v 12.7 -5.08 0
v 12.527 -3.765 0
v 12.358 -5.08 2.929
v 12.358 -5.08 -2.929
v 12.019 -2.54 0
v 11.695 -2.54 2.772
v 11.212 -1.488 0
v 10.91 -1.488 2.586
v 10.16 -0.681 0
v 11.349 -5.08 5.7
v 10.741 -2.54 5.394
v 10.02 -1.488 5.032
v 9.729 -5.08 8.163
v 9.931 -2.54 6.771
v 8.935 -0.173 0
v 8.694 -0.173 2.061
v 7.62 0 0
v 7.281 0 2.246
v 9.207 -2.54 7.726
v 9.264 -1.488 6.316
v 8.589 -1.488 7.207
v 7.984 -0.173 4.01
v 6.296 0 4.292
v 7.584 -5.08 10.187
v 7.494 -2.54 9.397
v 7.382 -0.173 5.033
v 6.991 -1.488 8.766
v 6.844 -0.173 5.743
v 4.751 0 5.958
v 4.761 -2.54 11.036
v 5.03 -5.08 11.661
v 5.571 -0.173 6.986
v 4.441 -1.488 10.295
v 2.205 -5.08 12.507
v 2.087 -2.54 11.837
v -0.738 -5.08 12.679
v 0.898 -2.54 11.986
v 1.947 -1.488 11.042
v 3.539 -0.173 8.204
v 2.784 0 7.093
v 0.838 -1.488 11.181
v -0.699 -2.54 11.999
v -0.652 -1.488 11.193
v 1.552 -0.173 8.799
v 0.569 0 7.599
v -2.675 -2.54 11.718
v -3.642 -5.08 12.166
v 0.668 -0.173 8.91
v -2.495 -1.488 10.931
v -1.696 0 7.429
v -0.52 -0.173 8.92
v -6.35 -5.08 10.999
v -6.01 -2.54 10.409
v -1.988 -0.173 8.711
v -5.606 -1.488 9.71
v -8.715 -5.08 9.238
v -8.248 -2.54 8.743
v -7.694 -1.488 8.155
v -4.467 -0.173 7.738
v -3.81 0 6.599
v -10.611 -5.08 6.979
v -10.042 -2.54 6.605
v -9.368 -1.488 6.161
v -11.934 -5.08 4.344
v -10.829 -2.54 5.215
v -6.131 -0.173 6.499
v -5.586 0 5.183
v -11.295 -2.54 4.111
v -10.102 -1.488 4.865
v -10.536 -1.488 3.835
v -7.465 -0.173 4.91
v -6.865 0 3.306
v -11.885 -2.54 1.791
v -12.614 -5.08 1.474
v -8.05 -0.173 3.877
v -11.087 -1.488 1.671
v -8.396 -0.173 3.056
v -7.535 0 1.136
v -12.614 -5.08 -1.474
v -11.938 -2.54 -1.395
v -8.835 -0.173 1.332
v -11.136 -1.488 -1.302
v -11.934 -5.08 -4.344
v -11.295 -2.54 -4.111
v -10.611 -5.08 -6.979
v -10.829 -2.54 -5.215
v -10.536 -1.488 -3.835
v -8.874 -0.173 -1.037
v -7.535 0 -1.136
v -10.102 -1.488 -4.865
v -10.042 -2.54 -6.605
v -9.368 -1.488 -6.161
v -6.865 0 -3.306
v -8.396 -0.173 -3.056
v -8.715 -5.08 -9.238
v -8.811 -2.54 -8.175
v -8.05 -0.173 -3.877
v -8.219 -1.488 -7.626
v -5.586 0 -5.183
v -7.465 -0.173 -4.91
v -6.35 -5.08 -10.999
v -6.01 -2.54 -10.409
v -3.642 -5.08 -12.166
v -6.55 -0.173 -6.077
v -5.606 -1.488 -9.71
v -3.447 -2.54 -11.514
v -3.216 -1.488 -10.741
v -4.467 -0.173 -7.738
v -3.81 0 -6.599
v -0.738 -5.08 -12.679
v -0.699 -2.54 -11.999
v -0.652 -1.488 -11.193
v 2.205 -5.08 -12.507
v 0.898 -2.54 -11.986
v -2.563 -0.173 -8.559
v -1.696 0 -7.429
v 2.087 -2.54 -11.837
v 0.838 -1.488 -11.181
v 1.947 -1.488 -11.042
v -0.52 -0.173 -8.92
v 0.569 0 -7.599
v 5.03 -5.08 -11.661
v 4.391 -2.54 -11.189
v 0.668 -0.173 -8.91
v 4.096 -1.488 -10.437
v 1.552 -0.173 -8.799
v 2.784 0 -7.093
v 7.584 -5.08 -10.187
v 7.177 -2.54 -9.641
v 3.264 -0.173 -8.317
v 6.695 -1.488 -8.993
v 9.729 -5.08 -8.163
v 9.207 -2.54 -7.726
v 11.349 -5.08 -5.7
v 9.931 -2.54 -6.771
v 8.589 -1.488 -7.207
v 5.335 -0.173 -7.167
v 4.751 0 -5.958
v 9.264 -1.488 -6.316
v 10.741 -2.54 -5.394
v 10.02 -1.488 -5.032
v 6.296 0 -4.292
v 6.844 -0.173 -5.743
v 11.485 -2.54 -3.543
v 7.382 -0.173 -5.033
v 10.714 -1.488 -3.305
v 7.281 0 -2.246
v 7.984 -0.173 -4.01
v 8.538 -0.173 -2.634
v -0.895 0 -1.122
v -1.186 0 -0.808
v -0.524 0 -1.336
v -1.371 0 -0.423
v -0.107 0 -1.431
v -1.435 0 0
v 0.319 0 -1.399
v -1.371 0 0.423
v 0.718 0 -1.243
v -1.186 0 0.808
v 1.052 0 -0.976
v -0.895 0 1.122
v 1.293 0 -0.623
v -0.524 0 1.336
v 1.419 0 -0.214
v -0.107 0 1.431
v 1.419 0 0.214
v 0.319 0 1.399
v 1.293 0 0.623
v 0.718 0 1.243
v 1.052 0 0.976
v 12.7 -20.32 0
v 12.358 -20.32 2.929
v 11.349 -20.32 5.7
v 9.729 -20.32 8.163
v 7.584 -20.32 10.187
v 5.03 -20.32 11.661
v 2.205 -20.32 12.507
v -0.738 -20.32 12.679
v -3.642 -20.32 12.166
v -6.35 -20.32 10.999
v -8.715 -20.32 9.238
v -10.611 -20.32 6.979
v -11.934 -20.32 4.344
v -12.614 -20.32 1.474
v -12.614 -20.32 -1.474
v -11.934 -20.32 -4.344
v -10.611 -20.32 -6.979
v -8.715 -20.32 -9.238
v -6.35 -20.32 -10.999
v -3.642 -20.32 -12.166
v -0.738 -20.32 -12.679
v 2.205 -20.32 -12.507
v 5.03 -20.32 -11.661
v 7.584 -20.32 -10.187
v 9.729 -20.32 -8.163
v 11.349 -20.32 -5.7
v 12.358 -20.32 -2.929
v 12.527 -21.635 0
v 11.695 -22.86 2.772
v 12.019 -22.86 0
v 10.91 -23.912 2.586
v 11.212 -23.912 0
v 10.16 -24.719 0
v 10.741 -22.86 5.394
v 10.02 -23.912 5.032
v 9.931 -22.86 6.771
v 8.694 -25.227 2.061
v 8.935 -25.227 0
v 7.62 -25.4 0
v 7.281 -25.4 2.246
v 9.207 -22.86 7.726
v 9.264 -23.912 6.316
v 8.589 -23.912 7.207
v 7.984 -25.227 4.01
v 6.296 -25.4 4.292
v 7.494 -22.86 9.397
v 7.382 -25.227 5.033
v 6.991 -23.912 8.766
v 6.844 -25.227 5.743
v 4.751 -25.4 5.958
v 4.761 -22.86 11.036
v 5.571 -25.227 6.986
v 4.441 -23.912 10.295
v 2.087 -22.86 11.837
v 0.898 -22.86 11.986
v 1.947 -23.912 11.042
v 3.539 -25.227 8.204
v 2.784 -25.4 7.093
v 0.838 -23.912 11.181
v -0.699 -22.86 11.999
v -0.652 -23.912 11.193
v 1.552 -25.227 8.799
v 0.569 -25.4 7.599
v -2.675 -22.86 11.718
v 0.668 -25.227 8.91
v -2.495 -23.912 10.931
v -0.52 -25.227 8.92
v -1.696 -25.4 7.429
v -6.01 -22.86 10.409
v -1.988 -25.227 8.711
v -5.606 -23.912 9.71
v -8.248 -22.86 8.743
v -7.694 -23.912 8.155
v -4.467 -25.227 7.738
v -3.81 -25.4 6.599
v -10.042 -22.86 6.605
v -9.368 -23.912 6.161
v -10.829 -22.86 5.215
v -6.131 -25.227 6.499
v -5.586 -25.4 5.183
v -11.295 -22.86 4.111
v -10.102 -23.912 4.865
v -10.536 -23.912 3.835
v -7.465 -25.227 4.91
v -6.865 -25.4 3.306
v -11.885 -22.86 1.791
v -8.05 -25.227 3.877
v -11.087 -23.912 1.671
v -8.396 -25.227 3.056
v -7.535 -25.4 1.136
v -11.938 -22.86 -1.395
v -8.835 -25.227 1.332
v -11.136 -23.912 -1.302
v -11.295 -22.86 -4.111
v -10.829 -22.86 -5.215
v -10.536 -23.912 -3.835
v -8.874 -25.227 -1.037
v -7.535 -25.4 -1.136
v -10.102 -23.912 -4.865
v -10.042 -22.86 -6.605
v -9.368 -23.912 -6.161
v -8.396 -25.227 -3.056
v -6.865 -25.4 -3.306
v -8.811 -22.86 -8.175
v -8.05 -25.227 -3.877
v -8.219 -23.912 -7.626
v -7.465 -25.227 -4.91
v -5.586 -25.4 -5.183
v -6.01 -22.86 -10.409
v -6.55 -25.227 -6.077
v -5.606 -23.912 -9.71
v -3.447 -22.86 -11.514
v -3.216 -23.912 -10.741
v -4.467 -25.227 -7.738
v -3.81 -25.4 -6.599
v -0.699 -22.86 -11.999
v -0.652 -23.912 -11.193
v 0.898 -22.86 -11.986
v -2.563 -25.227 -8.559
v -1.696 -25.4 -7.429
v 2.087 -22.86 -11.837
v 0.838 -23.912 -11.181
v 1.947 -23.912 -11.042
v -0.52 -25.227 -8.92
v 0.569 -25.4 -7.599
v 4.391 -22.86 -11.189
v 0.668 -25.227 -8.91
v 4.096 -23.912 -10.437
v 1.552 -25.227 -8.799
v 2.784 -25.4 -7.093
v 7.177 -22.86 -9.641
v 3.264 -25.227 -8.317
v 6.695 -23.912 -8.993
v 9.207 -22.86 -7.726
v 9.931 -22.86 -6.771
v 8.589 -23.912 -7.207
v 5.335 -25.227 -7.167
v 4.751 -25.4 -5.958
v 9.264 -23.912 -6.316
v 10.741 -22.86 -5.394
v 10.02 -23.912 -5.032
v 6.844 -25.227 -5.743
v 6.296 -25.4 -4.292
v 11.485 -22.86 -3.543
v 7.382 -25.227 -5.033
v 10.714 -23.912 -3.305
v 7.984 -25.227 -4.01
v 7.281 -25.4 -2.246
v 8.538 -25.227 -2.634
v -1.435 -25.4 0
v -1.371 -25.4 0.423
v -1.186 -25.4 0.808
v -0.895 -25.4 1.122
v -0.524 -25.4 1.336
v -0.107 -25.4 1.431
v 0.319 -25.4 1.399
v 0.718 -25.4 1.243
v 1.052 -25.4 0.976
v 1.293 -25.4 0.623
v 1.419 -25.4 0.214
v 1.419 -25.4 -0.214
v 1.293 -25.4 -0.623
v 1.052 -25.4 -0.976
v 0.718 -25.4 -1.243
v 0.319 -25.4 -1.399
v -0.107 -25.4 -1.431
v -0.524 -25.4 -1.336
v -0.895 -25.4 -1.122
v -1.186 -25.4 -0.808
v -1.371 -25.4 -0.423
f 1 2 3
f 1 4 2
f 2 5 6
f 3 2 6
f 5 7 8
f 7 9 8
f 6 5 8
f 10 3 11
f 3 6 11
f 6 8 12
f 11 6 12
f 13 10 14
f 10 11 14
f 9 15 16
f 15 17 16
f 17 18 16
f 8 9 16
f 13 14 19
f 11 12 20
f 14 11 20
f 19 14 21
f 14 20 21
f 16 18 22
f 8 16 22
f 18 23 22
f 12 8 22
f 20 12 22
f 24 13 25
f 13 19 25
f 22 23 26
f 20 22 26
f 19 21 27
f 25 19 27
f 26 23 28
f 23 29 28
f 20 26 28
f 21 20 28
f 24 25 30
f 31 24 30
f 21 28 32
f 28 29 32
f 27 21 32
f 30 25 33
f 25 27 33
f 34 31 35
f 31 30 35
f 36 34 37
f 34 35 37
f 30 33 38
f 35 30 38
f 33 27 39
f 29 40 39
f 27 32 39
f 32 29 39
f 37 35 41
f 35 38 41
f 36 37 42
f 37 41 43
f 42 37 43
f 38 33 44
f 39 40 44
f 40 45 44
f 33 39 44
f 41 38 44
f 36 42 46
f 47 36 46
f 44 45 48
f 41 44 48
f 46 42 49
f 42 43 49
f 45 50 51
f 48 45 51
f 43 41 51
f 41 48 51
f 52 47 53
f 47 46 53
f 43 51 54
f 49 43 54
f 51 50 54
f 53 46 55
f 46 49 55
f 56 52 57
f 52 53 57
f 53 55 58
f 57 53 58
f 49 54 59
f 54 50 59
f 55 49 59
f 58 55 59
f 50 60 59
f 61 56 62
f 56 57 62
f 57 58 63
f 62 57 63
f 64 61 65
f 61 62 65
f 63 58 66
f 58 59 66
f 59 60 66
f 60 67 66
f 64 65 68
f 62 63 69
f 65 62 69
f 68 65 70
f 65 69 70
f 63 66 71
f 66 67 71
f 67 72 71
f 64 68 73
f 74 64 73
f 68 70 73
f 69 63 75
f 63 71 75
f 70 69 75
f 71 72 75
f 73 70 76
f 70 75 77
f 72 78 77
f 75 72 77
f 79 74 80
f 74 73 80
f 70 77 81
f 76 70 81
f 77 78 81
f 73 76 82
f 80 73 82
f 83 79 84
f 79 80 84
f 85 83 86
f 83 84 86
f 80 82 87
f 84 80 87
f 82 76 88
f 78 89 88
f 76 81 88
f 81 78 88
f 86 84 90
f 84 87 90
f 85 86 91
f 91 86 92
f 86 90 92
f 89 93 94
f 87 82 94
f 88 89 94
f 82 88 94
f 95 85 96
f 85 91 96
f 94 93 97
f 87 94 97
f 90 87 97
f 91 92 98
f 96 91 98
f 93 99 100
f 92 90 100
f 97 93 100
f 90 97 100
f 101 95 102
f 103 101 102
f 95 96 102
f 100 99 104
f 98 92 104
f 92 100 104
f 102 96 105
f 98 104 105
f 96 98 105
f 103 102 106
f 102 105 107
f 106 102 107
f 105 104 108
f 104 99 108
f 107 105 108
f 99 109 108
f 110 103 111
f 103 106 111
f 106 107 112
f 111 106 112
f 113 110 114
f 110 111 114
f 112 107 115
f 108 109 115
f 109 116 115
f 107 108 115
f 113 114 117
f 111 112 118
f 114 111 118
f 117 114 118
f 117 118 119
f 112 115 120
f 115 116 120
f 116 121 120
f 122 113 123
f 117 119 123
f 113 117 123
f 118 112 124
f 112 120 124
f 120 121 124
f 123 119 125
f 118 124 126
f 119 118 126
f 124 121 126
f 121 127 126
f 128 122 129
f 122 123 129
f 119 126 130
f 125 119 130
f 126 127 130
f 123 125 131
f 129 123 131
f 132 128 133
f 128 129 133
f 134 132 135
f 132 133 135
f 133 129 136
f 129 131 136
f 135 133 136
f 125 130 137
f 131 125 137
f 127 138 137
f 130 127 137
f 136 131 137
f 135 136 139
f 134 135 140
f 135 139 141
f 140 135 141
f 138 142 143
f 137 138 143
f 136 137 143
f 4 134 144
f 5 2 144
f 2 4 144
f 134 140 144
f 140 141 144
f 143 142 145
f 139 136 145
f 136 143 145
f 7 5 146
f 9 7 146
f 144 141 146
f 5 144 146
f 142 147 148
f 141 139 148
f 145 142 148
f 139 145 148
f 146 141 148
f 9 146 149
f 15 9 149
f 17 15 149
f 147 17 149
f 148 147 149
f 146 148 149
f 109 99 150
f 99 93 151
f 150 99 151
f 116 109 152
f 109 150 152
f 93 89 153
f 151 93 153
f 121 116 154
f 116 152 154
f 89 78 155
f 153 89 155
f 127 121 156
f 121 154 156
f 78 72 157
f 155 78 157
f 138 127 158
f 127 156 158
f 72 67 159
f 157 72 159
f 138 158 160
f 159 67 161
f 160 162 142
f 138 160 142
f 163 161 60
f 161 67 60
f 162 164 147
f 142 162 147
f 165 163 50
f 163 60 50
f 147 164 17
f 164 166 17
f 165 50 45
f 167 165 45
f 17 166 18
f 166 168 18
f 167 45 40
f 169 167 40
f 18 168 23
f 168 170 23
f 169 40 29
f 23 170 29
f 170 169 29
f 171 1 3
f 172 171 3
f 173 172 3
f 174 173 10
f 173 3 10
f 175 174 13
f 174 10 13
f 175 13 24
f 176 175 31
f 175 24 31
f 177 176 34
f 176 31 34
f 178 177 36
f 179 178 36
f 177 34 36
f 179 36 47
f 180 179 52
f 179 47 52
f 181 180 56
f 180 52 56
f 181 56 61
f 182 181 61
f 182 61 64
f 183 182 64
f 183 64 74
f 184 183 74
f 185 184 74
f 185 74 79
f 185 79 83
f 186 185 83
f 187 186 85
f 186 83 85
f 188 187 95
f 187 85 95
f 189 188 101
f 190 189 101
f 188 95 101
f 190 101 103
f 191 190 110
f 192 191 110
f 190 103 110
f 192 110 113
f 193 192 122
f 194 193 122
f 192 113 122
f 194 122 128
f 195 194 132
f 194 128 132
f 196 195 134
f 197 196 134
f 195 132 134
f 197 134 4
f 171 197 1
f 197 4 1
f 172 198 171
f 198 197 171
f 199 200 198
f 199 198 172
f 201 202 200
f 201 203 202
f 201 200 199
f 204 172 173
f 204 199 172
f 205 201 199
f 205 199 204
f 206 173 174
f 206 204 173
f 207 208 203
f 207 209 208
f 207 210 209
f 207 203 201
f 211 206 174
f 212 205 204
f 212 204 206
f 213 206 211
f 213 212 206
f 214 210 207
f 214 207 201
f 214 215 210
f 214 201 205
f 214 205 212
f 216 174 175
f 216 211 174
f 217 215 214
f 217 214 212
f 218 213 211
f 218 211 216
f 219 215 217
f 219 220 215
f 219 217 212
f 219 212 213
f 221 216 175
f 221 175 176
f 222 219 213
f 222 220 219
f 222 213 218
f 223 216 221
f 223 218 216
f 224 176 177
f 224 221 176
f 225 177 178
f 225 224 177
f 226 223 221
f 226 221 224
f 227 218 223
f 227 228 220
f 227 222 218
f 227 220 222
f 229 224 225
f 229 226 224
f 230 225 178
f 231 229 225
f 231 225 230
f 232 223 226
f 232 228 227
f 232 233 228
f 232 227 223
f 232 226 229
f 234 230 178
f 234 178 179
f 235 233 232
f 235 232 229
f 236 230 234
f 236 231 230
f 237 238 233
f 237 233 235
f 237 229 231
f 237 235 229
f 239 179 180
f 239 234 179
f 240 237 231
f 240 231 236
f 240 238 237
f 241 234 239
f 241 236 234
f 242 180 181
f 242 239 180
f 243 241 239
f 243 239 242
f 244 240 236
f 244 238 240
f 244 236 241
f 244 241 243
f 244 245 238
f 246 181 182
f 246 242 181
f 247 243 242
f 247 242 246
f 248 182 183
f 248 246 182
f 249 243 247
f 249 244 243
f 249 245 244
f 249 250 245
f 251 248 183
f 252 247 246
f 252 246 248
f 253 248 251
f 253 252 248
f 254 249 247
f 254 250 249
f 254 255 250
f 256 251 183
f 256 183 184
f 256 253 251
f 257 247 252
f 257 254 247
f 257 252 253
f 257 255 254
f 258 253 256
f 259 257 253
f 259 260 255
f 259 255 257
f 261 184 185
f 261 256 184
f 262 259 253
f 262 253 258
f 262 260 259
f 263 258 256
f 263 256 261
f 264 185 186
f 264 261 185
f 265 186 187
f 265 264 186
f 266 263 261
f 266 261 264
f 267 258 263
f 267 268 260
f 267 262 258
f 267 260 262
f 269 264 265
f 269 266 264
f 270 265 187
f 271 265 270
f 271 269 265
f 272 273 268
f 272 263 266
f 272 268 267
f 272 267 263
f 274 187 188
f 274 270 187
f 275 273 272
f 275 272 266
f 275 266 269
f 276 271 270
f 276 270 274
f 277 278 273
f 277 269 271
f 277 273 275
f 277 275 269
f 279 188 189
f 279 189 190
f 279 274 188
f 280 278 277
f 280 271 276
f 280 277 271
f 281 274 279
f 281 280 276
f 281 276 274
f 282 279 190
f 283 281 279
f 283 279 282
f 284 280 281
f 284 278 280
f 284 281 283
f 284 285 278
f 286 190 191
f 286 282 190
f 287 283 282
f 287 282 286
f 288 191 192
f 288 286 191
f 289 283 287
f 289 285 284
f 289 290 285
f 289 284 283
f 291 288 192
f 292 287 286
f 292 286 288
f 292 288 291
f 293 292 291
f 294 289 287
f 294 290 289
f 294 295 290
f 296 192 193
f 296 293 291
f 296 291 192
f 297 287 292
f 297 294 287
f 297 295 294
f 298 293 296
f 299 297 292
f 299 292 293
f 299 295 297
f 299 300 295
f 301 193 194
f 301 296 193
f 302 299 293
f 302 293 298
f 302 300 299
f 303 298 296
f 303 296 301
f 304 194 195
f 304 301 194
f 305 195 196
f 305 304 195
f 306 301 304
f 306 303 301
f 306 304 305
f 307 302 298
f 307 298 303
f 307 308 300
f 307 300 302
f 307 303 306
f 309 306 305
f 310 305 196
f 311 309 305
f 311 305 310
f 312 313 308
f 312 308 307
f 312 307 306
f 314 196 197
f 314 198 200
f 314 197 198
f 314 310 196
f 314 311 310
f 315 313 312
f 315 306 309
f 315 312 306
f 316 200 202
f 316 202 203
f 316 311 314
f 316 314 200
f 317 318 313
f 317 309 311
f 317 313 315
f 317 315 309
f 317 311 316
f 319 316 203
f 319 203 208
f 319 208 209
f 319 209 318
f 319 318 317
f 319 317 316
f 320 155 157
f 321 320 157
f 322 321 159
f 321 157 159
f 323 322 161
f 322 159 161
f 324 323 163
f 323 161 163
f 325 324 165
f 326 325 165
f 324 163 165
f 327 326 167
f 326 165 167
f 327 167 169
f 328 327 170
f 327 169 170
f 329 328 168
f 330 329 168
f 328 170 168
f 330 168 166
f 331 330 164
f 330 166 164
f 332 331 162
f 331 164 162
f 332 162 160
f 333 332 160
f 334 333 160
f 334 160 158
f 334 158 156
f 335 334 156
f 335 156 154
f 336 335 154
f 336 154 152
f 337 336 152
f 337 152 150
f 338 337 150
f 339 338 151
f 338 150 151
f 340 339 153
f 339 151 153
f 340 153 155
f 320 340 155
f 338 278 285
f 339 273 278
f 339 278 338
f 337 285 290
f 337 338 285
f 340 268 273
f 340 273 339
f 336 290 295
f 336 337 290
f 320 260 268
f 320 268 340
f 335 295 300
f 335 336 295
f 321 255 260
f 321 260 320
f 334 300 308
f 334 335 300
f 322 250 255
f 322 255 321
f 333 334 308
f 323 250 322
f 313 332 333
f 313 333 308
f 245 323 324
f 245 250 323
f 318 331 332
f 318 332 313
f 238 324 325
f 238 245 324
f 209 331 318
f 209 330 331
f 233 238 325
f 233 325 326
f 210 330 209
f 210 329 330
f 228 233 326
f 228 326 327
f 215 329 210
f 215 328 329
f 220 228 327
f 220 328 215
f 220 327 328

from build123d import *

# Parameters (mm, degrees)
F0_R     = 12.7
F1_DEPTH = 25.4
F2_DEPTH = 17.78
F3_R     = 5.08
F4_R     = 1.4351
F5_DEPTH = 25.4


with BuildPart() as f1:
    # F0 (on Front) → F1 (new body)
    with BuildSketch(Plane.XZ):
        Circle(F0_R)
    extrude(amount=F1_DEPTH)

    # F0 (on Front) → F2 (join)
    with BuildSketch(Plane.XZ):
        Circle(F0_R)
    extrude(amount=F2_DEPTH)

    # F3
    f3_edges = [f1.edges().sort_by_distance(p)[0] for p in [
        (-12.7, 0, 0),
        (-12.7, -25.4, 0),
    ]]
    fillet(f3_edges, radius=F3_R)

    # F4 (on face) → F5 (cut)
    with BuildSketch(Plane(origin=(0, 0, 0), x_dir=(-1, 0, 0), z_dir=(0, 1, 0))):
        Circle(F4_R)
    extrude(amount=-F5_DEPTH, mode=Mode.SUBTRACT)


solid = f1.part
